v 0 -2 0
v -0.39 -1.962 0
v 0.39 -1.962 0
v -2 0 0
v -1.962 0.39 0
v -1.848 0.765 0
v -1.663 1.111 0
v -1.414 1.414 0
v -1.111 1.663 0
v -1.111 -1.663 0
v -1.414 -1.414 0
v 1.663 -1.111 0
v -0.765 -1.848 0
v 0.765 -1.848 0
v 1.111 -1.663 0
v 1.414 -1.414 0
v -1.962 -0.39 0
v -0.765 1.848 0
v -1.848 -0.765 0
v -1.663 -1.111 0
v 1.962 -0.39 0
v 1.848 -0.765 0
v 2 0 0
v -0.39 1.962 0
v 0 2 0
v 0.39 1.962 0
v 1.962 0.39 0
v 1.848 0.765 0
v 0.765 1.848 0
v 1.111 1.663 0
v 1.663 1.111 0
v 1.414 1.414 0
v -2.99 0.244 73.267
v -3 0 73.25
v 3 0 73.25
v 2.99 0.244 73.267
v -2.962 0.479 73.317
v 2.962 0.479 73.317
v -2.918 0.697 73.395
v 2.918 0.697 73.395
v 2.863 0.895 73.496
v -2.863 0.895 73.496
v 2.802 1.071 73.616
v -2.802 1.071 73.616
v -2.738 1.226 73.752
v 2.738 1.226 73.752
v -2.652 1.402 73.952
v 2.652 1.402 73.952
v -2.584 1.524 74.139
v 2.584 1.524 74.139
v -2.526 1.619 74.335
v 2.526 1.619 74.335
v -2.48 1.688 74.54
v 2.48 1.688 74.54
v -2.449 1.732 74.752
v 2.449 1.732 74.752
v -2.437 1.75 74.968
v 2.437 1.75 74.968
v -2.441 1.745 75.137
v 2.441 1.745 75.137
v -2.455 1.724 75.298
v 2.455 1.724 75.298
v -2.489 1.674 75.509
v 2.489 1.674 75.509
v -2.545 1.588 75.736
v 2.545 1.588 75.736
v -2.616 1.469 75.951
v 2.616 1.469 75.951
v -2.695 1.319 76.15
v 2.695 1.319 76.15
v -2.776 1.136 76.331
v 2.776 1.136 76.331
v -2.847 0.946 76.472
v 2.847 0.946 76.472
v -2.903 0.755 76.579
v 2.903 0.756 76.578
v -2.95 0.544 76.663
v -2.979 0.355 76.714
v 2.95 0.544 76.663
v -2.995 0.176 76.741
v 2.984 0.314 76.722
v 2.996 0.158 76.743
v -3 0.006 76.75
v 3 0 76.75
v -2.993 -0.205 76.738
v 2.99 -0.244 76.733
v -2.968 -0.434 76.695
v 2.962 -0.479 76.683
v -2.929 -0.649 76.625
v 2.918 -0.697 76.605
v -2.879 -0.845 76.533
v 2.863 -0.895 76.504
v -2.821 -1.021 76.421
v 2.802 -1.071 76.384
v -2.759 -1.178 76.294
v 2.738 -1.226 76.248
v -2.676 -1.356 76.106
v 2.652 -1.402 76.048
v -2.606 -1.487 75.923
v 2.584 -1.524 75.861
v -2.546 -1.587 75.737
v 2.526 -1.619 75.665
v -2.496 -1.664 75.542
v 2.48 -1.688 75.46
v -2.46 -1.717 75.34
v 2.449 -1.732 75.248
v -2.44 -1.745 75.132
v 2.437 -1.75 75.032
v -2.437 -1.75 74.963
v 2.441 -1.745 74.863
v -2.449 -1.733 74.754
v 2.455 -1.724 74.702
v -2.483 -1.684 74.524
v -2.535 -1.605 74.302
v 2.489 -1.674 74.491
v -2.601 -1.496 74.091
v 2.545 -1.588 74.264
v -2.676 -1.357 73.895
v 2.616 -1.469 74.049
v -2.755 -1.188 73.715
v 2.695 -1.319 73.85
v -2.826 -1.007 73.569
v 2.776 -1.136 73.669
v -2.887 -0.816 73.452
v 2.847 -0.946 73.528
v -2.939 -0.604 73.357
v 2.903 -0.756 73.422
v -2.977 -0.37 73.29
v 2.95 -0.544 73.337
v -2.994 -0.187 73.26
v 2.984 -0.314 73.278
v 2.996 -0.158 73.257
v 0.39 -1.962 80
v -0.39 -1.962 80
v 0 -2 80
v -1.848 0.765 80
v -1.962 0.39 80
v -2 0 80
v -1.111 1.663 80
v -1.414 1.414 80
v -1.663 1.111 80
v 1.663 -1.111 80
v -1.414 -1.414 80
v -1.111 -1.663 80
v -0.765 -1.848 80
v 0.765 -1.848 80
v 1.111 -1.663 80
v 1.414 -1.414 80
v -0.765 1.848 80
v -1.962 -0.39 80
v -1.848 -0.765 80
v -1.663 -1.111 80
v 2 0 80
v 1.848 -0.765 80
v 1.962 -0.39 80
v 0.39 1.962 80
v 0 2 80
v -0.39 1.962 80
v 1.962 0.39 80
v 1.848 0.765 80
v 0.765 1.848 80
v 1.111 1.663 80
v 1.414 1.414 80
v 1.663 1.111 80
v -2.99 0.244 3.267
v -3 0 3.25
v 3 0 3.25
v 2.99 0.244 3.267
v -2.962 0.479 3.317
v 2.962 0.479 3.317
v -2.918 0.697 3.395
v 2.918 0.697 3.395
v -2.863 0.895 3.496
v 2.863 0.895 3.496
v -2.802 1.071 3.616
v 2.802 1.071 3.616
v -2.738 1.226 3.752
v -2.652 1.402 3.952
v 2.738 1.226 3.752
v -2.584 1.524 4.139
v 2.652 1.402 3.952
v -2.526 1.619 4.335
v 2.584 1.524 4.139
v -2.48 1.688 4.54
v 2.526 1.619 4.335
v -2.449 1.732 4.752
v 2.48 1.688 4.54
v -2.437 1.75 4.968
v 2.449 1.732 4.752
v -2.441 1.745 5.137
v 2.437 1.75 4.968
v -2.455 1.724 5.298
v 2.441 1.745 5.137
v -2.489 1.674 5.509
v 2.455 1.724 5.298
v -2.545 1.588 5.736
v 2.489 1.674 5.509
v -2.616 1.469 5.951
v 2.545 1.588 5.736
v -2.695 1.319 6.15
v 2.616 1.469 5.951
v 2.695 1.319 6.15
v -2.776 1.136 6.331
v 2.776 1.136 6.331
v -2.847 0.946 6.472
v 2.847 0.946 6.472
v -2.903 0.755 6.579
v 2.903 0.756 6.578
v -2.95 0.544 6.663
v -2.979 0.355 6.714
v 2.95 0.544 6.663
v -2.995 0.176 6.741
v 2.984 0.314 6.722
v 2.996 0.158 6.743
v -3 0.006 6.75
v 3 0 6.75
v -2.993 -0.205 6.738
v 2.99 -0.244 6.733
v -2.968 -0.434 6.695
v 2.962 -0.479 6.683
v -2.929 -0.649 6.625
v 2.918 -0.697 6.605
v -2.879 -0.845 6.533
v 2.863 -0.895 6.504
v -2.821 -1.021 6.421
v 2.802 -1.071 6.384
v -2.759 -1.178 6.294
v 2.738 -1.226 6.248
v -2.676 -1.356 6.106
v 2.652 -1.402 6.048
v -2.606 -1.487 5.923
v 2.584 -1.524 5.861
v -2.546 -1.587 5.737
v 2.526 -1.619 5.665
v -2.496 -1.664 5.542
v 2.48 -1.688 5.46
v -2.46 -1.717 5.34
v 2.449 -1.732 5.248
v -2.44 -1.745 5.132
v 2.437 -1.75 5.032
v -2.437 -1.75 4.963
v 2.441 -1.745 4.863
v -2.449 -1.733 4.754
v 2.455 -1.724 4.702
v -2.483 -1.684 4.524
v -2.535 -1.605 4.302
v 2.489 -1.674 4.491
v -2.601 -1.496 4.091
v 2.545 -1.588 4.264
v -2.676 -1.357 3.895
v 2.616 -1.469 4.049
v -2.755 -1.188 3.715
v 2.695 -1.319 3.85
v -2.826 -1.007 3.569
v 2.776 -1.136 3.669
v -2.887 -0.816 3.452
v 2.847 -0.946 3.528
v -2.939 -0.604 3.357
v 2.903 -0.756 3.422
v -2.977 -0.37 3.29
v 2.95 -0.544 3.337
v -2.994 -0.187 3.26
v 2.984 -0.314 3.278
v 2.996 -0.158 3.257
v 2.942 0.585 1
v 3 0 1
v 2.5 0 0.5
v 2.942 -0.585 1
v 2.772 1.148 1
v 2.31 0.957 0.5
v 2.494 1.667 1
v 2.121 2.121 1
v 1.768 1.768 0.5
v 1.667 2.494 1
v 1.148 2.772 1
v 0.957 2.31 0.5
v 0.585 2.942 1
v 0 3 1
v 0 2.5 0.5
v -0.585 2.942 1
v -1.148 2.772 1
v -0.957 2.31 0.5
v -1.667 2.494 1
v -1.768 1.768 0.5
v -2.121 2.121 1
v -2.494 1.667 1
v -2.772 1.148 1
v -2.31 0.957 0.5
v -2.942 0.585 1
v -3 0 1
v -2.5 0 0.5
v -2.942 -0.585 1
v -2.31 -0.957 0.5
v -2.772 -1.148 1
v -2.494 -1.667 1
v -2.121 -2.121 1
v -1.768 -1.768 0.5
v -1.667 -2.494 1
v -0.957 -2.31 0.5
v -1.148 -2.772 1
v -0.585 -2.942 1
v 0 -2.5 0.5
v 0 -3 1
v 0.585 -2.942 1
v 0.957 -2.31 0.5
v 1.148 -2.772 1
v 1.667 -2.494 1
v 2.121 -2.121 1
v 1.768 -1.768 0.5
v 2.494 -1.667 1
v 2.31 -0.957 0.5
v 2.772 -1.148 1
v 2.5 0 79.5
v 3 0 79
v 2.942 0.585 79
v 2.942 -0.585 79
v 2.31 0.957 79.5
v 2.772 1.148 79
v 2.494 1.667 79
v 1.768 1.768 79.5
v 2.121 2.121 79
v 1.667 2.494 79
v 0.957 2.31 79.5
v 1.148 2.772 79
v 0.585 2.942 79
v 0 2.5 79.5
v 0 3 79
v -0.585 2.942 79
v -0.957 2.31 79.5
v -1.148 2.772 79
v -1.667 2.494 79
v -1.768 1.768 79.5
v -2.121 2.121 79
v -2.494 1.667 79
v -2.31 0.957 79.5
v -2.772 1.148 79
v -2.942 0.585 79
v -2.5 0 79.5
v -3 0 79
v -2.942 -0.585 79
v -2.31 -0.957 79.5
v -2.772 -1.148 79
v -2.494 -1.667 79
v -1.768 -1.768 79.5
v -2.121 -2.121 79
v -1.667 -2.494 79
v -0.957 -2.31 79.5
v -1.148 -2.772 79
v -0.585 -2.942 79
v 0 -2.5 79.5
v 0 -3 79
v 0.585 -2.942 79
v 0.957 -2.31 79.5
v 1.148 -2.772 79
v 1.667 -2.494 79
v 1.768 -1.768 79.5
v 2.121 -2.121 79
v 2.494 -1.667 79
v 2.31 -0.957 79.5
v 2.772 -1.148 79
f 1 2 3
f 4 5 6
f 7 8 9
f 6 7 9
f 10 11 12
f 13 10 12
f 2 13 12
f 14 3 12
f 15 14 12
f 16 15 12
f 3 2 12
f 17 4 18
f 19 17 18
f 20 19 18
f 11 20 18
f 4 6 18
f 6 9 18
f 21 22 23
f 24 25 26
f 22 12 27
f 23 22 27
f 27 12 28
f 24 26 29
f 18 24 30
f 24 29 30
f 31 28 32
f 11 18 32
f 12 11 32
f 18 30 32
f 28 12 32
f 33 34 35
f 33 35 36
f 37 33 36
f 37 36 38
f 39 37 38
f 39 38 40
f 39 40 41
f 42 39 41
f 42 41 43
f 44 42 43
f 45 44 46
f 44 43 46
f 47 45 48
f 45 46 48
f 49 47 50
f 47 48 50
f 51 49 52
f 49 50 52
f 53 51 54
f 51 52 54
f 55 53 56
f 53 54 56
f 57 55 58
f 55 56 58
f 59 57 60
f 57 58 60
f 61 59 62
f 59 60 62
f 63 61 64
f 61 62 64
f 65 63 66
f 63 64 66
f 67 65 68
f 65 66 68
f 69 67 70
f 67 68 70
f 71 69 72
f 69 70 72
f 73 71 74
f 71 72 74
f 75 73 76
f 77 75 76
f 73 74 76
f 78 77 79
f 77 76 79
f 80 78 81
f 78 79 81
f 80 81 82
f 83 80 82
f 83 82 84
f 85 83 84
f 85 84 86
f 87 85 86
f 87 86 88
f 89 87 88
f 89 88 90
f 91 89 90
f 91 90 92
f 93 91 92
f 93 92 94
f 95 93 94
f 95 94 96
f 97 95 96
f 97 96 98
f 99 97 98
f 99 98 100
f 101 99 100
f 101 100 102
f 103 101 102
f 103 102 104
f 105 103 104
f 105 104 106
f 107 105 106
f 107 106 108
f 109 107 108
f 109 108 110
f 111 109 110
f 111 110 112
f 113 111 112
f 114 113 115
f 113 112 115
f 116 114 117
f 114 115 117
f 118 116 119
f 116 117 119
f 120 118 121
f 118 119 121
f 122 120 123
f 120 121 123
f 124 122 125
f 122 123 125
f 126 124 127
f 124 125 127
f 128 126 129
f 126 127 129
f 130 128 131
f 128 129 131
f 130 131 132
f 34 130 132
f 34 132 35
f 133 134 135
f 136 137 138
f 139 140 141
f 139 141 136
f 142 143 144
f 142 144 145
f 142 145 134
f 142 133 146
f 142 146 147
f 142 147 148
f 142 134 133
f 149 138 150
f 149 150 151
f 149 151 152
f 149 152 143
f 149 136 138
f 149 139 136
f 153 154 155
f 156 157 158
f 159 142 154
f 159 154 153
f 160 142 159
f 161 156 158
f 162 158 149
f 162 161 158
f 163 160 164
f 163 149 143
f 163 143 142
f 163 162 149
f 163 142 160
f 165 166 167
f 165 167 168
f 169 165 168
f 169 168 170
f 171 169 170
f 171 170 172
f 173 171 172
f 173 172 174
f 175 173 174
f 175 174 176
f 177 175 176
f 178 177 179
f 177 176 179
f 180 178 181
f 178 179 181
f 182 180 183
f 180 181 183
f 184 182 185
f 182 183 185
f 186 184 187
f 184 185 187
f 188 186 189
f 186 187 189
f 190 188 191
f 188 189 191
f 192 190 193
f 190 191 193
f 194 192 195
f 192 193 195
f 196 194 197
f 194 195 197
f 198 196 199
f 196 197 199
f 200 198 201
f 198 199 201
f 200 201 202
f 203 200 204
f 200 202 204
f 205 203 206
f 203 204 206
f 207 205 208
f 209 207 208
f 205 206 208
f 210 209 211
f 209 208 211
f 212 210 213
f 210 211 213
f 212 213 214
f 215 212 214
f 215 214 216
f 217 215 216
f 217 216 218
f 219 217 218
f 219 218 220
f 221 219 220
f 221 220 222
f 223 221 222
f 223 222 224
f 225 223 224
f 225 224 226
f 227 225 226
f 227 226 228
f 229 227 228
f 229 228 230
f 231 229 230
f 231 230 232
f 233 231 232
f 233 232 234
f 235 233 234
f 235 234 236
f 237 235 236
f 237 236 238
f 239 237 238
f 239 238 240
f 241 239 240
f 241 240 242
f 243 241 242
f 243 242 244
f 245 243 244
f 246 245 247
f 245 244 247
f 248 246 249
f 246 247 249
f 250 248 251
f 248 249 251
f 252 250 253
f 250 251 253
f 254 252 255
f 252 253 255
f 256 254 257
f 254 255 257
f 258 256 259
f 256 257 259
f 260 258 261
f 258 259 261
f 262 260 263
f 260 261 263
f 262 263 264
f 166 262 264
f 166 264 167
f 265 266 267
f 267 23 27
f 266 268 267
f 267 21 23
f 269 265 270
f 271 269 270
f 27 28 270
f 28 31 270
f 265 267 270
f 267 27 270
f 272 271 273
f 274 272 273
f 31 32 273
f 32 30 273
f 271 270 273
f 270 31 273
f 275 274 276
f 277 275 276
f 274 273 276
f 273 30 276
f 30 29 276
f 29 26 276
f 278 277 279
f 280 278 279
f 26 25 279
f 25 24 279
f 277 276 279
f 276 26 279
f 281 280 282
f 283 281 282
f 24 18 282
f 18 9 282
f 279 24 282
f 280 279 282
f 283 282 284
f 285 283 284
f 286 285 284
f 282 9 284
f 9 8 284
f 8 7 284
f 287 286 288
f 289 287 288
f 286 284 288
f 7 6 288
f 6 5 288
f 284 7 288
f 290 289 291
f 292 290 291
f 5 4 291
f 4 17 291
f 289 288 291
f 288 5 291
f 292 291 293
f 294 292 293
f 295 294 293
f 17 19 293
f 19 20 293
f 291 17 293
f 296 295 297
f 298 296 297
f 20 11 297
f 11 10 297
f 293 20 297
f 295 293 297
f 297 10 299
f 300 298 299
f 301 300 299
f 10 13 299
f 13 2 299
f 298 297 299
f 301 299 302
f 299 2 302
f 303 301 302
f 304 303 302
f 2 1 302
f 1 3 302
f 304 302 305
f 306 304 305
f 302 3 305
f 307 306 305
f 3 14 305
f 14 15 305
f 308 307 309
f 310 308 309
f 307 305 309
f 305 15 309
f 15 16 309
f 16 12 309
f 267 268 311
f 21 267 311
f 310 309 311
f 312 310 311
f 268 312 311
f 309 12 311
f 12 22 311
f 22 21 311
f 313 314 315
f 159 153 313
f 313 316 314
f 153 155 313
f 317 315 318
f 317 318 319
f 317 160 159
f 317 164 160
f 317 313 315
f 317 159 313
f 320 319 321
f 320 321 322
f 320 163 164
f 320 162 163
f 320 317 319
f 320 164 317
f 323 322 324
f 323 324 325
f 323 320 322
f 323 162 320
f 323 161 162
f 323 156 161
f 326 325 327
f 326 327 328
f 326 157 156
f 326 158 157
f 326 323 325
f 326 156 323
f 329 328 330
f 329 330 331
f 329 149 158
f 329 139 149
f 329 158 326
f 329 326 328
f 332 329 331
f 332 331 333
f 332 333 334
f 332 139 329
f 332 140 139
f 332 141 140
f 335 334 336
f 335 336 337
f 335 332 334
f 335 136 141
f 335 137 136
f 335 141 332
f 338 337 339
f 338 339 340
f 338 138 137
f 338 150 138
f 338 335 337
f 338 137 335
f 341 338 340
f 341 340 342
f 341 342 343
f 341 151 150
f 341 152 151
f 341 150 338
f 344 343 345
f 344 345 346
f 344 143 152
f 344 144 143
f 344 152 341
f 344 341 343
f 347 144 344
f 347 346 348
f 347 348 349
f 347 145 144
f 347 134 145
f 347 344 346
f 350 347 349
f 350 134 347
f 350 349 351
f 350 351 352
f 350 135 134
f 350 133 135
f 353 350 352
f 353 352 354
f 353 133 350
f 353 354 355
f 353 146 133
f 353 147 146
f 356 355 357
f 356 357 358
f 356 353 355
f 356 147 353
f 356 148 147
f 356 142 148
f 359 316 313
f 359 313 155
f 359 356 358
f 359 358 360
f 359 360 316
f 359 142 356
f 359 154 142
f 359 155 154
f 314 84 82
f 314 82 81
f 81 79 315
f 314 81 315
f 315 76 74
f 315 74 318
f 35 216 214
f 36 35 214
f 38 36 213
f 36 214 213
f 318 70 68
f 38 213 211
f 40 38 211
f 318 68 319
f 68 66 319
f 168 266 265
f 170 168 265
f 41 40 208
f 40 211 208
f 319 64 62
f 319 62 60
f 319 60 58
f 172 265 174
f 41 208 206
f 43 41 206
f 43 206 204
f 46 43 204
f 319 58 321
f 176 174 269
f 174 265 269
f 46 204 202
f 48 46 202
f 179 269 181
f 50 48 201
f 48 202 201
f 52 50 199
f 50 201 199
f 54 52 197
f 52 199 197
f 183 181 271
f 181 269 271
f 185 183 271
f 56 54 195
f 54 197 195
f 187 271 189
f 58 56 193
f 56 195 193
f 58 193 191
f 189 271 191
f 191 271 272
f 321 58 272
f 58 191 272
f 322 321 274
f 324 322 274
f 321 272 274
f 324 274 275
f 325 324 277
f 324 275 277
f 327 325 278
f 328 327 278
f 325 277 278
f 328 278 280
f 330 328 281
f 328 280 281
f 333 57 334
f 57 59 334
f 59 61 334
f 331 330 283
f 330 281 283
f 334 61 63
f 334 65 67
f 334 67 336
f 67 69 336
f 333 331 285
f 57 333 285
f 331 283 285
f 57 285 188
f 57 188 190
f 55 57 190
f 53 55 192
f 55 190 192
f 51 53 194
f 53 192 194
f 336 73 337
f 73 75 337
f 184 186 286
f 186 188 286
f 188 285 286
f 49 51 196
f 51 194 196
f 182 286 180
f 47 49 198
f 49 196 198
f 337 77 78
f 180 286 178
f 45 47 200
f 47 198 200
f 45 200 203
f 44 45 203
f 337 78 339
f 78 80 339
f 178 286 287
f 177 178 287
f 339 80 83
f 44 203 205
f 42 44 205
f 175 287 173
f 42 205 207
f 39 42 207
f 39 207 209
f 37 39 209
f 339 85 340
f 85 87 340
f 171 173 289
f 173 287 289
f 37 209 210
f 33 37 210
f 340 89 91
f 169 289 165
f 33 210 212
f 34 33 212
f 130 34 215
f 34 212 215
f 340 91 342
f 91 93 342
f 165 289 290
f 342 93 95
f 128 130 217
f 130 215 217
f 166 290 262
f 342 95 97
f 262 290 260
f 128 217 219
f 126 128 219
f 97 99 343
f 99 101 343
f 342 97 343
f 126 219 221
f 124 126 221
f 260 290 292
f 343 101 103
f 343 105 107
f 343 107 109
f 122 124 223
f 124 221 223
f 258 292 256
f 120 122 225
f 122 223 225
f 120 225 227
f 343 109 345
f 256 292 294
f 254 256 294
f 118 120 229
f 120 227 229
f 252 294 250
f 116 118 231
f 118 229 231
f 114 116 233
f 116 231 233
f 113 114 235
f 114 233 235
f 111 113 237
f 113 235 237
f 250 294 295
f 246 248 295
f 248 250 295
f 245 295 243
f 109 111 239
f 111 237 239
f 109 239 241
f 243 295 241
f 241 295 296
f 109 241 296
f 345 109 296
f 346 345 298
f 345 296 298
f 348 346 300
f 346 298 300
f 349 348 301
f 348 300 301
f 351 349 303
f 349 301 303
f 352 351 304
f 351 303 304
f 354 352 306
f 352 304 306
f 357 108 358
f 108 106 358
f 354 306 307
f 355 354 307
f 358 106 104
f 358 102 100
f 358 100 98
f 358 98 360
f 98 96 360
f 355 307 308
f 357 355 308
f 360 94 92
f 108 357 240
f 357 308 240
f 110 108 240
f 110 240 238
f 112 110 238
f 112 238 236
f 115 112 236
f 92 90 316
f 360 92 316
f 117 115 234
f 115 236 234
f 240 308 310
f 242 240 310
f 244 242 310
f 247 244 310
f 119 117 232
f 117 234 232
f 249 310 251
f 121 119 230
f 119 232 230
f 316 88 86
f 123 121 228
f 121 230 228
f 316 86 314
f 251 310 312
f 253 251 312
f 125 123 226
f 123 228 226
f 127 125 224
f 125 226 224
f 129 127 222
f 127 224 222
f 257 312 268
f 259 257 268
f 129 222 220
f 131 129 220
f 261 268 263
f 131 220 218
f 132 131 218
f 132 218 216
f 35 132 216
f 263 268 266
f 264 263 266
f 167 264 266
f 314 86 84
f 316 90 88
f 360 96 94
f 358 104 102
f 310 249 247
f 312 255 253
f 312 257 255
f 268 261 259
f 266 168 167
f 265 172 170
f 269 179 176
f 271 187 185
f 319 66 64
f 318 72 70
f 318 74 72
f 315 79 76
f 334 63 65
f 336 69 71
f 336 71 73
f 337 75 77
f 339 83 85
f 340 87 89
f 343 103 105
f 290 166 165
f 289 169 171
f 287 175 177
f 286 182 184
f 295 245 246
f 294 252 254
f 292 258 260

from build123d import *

# Parameters (mm, degrees)
SKETCH_1_R          = 3
EXTRUDE_1_DEPTH     = 5
SKETCH_2_R          = 3
EXTRUDE_2_DEPTH     = 75
SKETCH_3_R          = 1.75
CUT_EXTRUDE_1_DEPTH = 81.280757346
CHAMFER_1_SIZE      = 1


with BuildPart() as part:
    # Эскиз1 → Бобышка-Вытянуть1 (new body)
    with BuildSketch(Plane.XY):
        Circle(SKETCH_1_R)
    extrude(amount=EXTRUDE_1_DEPTH)

    # Эскиз2 → Бобышка-Вытянуть2 (add)
    with BuildSketch(Plane.XY.offset(5)):
        Circle(SKETCH_2_R)
    extrude(amount=EXTRUDE_2_DEPTH)

    # Эскиз3 → Вырез-Вытянуть1 (cut, through all)
    with BuildSketch(Plane(origin=(3, 0, 0), x_dir=(0, 0, -1), z_dir=(1, 0, 0))):
        with Locations((-75, 0)):
            Circle(SKETCH_3_R)
        with Locations((-5, 0)):
            Circle(SKETCH_3_R)
    extrude(amount=-CUT_EXTRUDE_1_DEPTH, mode=Mode.SUBTRACT)

    # Фаска1
    chamfer_1_edges = [part.edges().sort_by_distance(p)[0] for p in [
        (-3, 0, 0),
        (-3, 0, 80),
    ]]
    chamfer(chamfer_1_edges, length=CHAMFER_1_SIZE)


solid = part.part
